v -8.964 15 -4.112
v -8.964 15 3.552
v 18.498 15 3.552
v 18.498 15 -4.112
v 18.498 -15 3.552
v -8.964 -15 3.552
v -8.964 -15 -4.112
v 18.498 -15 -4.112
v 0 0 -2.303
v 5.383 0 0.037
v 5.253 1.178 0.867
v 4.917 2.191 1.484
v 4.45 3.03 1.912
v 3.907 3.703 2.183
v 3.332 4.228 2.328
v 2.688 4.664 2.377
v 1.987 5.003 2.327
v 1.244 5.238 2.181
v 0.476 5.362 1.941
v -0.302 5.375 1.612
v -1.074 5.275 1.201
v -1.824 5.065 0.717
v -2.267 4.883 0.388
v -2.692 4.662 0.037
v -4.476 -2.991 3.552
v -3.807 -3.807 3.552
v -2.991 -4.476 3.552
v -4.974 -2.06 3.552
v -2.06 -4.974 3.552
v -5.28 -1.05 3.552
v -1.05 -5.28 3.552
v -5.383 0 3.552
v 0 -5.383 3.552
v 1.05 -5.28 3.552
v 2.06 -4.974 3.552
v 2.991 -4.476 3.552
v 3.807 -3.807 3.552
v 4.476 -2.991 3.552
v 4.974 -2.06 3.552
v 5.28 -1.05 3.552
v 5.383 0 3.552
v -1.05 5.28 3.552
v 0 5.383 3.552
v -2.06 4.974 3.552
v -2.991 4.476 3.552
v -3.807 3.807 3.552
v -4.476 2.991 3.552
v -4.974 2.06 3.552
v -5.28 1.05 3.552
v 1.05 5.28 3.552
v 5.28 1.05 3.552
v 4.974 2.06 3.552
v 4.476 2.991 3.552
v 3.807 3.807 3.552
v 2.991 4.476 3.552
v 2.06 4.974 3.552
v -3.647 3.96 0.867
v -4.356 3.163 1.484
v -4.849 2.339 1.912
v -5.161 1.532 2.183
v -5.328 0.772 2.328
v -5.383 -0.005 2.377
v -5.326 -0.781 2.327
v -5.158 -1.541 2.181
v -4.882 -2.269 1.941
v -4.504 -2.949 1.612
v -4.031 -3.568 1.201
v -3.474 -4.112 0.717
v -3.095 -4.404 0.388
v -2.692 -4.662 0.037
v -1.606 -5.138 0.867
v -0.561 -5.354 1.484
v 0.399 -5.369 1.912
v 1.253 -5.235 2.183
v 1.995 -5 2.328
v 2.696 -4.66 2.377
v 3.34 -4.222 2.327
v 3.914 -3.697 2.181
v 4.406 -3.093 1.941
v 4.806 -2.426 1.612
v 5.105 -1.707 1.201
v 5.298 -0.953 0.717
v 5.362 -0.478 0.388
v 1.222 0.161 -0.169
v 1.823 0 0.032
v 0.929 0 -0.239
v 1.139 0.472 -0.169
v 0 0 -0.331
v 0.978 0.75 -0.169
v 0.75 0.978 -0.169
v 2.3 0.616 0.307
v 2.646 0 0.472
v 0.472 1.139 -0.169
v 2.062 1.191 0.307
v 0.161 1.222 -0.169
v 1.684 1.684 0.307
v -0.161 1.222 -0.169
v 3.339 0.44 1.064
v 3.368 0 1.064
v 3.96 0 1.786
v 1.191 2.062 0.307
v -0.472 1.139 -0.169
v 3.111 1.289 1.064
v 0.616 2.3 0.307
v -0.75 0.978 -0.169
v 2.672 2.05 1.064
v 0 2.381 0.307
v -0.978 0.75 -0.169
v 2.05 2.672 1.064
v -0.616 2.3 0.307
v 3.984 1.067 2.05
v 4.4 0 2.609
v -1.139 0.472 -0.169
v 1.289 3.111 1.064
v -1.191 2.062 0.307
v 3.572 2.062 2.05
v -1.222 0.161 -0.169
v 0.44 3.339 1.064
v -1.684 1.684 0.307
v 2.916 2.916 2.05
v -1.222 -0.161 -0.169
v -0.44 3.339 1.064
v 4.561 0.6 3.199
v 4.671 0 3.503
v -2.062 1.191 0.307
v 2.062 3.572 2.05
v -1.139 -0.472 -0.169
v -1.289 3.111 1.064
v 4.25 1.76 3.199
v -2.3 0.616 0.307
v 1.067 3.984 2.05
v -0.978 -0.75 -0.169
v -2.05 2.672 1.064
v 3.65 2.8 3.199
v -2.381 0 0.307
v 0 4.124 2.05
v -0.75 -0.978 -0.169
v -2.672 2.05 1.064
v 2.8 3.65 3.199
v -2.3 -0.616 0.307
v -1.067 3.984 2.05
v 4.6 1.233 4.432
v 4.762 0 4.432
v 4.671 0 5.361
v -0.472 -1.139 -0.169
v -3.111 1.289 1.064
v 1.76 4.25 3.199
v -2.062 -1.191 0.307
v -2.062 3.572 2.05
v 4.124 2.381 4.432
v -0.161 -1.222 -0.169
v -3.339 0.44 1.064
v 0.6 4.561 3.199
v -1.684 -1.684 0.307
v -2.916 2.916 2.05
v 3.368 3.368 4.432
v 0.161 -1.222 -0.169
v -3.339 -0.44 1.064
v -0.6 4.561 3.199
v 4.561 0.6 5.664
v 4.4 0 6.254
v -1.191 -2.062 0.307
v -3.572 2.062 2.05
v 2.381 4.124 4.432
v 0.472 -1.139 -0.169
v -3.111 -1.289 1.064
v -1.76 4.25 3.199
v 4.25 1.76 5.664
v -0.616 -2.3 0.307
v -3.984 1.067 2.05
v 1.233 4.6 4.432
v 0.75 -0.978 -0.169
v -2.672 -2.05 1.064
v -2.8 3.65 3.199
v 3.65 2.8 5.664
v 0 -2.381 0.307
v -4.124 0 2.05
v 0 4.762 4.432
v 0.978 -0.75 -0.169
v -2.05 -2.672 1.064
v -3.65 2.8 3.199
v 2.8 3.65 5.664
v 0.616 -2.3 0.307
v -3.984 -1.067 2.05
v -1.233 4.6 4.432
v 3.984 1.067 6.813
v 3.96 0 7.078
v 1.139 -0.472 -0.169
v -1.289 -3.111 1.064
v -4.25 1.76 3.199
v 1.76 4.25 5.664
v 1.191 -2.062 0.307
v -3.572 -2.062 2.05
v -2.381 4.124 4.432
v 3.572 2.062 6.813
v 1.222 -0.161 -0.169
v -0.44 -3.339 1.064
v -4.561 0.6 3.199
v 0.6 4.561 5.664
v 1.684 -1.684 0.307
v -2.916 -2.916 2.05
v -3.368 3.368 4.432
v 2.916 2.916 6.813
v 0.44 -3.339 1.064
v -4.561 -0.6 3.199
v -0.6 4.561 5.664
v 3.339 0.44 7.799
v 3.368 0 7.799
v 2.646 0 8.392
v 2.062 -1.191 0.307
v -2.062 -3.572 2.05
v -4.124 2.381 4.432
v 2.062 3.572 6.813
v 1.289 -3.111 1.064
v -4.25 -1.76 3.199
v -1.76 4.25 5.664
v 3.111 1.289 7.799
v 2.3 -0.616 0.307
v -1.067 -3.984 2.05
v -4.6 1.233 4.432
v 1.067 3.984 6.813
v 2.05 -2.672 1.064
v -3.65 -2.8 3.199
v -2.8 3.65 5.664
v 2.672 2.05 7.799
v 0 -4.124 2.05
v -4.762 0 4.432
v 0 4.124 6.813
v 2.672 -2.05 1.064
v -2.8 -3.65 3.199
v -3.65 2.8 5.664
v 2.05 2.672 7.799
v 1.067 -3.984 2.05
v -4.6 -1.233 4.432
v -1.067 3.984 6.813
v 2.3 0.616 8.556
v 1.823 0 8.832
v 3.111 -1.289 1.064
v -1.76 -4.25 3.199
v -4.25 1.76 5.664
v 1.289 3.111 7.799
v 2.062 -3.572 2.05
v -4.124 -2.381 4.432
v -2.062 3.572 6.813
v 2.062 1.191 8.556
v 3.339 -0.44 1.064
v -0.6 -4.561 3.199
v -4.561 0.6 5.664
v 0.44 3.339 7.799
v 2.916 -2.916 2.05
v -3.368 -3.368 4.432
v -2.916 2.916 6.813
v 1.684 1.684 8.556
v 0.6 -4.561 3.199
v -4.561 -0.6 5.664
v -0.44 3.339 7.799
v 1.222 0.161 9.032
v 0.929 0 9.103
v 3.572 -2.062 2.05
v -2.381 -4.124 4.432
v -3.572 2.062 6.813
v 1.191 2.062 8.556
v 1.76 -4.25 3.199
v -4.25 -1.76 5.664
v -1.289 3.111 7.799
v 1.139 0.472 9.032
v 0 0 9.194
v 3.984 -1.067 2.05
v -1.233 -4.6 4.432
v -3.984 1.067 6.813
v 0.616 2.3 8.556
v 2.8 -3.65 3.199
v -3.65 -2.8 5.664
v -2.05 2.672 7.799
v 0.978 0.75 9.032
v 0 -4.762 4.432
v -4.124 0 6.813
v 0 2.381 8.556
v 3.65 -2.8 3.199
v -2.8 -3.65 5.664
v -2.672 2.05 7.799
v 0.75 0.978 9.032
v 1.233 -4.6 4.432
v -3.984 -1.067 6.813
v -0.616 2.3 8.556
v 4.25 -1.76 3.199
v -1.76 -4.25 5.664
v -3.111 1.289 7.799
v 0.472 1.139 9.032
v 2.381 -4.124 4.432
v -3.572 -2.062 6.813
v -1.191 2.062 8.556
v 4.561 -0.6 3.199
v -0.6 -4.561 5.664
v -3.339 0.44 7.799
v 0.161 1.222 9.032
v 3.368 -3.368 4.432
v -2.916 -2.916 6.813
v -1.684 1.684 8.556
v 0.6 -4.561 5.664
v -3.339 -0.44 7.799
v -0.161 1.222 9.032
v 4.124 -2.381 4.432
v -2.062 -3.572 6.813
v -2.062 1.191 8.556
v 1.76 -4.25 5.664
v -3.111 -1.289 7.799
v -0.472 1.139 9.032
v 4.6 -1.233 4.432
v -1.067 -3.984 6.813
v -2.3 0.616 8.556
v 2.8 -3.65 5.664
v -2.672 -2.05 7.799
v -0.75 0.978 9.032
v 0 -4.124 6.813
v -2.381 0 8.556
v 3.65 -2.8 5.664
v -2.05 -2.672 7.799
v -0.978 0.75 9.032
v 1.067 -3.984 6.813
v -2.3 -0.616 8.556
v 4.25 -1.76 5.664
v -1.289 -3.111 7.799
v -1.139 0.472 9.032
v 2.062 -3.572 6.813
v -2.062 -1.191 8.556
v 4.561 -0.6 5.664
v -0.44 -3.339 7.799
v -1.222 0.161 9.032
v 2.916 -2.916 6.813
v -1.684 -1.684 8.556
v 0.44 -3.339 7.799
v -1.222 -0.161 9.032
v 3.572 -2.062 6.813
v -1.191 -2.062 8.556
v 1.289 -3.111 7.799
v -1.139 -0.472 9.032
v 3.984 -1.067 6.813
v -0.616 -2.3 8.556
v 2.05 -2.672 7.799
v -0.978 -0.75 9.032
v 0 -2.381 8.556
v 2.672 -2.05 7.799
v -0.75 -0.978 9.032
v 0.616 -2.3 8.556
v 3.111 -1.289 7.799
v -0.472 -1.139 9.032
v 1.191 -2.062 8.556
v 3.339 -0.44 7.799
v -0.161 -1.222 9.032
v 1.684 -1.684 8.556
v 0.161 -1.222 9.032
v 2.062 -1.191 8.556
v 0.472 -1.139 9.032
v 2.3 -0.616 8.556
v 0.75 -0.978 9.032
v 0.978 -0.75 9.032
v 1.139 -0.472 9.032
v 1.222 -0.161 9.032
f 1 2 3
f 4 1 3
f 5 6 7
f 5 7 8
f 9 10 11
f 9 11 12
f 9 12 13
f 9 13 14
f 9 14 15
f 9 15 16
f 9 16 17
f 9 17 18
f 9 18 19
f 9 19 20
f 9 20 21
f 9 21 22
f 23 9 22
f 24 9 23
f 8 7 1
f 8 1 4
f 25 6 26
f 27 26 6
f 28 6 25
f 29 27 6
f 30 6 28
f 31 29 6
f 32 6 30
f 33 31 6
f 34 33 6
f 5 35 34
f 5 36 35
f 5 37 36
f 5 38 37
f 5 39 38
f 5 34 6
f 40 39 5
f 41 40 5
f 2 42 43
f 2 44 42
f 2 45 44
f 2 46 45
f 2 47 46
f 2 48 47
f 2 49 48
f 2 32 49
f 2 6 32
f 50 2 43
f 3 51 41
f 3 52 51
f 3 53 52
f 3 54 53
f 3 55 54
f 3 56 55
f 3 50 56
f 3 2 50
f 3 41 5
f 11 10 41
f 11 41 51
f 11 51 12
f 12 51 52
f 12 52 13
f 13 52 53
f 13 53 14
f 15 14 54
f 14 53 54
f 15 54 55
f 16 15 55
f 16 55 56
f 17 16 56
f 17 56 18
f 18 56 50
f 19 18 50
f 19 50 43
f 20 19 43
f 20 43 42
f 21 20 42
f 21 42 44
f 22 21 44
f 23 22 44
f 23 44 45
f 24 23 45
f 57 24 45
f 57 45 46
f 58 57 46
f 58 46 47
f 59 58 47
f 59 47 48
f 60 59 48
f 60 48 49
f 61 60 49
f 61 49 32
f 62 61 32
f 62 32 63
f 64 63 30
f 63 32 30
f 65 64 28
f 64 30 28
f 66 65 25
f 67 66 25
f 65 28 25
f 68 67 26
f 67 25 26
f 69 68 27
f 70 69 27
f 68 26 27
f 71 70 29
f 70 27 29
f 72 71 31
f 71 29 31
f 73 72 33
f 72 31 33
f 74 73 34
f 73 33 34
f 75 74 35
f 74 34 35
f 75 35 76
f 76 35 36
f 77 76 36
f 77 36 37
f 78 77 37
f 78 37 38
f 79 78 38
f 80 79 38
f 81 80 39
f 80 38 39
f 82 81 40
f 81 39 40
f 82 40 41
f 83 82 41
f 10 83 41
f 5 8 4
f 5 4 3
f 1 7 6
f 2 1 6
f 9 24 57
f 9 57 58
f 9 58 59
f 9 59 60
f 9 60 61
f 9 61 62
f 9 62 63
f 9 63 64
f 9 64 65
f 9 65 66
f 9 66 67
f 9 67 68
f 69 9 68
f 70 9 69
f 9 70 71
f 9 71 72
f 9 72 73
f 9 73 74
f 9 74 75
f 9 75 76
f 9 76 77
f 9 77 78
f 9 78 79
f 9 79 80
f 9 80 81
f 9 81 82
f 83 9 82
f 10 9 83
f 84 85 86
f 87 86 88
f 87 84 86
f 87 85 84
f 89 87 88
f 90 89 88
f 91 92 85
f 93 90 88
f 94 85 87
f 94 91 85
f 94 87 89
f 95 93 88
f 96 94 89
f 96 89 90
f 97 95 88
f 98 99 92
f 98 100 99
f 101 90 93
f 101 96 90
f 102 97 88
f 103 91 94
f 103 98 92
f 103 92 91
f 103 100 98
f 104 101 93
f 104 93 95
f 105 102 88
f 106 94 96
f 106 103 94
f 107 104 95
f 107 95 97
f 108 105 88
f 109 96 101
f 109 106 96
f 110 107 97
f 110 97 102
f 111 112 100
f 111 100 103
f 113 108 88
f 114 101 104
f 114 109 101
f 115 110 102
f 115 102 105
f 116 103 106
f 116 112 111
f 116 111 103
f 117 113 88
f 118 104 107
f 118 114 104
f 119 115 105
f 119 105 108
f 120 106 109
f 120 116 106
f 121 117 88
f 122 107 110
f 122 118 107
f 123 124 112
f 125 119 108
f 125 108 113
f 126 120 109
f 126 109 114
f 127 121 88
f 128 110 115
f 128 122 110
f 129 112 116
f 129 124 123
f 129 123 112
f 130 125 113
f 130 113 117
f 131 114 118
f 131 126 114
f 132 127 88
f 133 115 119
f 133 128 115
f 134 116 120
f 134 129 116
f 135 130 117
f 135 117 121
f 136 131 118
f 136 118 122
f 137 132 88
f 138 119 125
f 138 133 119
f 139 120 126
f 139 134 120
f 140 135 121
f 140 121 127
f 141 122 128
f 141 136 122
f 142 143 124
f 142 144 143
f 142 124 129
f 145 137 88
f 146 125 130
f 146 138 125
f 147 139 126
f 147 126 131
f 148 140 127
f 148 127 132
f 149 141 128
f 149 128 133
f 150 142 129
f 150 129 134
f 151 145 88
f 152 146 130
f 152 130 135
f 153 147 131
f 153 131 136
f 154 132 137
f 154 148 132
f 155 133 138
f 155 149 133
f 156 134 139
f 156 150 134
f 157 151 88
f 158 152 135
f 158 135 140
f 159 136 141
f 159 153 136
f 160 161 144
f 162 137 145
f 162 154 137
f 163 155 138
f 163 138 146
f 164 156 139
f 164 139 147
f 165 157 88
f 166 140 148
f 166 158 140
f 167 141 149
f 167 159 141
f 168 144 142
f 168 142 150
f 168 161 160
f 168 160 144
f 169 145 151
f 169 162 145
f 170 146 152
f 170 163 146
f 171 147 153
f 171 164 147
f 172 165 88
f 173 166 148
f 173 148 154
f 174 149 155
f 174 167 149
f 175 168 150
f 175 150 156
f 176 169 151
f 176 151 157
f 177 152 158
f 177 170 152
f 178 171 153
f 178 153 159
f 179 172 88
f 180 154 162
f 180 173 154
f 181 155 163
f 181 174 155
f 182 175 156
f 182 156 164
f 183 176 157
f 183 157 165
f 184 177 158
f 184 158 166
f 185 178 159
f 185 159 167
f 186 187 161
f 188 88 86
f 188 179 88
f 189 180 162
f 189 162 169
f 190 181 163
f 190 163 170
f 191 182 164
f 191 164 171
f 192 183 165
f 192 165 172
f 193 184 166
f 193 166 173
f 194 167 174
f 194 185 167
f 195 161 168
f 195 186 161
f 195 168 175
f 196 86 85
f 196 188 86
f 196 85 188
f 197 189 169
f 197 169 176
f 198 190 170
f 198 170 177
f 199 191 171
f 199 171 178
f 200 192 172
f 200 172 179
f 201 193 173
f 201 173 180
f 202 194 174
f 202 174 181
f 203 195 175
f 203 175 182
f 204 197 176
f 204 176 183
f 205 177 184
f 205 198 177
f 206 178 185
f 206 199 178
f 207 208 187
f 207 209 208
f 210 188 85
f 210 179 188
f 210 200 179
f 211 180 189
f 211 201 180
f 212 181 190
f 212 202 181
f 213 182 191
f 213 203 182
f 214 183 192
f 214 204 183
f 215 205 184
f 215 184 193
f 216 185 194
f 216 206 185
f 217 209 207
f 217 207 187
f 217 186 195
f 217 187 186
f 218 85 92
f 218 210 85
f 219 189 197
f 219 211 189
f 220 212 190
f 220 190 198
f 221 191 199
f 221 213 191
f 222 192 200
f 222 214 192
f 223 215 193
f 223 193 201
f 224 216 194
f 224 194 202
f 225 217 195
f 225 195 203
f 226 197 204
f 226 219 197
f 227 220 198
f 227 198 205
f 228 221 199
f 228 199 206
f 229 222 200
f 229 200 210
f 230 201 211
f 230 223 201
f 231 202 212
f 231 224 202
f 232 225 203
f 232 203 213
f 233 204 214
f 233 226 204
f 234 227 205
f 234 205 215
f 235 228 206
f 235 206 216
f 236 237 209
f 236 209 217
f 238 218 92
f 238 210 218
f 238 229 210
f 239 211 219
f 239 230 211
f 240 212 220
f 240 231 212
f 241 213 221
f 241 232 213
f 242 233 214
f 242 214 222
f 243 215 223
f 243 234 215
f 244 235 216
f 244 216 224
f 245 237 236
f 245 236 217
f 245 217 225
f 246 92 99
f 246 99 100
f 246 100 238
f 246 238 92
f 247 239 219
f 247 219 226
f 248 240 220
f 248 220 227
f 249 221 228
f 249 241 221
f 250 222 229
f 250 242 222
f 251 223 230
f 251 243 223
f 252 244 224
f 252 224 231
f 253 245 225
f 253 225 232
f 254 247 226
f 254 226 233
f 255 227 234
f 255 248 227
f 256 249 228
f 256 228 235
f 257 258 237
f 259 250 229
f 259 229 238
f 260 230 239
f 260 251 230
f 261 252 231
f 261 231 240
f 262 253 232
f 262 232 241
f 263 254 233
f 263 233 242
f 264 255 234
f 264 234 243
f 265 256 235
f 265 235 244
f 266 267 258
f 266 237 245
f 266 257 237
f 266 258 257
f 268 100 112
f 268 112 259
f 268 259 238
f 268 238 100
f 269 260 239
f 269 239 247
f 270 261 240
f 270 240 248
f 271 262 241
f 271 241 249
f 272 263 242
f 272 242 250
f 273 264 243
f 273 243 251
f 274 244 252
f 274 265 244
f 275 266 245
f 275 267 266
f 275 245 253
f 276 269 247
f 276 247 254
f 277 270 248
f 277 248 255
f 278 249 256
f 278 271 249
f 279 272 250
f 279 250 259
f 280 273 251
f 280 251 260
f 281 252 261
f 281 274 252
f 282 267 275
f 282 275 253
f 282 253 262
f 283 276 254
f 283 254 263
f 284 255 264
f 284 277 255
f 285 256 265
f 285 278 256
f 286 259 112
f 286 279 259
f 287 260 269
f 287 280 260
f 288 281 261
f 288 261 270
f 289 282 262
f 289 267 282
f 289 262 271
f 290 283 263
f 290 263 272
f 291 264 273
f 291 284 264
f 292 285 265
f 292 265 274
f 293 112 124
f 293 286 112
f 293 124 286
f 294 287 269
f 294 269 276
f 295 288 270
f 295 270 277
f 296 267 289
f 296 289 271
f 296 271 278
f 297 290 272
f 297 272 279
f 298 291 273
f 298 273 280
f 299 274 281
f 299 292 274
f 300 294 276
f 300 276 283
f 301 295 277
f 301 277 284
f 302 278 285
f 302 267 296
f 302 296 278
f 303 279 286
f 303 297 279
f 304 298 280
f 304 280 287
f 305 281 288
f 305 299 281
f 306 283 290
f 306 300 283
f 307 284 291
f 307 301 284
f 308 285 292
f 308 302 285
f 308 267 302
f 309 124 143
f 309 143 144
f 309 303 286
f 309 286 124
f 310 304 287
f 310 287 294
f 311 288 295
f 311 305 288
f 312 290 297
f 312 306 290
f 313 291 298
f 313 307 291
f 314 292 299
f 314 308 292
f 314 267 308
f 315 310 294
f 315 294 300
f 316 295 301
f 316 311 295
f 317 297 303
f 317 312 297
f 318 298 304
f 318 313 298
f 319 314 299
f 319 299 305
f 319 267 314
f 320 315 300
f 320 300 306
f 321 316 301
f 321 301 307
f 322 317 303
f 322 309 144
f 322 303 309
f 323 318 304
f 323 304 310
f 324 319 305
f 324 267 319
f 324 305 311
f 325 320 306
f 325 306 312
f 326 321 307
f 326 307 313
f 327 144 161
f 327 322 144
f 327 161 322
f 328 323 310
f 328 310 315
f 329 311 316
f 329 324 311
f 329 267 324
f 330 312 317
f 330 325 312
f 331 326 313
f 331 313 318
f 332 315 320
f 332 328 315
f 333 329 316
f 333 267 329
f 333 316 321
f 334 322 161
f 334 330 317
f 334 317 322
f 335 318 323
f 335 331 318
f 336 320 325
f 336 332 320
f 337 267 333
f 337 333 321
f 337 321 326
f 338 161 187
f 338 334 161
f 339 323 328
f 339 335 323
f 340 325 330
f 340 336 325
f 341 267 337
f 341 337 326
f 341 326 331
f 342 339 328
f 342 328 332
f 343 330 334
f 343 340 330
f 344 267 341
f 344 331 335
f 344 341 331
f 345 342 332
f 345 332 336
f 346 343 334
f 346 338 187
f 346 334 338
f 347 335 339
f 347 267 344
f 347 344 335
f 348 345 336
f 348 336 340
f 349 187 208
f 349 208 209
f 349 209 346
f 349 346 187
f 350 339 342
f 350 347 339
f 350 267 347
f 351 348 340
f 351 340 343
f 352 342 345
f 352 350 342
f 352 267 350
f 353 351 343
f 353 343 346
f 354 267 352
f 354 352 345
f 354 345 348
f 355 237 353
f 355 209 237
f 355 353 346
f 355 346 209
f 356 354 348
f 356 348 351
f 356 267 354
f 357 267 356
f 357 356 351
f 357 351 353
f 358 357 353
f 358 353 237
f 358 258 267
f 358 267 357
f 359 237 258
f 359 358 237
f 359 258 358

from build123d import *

# Parameters (mm, degrees)
F1_W     = 27.461335063
F1_H     = 7.6640169136
F2_DEPTH = 15
F5_R     = 5.3833305073


with BuildPart() as f2:
    # F1 (on Front) → F2 (new body, symmetric)
    with BuildSketch(Plane.XZ):
        with Locations((4.7669634223, -0.2798696514)):
            Rectangle(F1_W, F1_H)
    extrude(amount=F2_DEPTH, both=True)

    # F3 (on face) → F4 section 0
    with BuildSketch(Plane.XY.offset(3.5521388054), mode=Mode.PRIVATE) as f4_s0:
        Polygon((-6.7351920908, 11.6656949), (-6.7351920908, -11.6656949), (13.4703841816, 0), align=None)
    loft([f4_s0.sketch, Vertex(0, 0, -2.3034810466)], mode=Mode.SUBTRACT)

    # F5 (on face) → F6 (join, up to the next surface of F2)
    with BuildSketch(Plane.XY.offset(3.5521388054)):
        Polygon((-6.7351920908, 11.6656949), (-6.7351920908, -11.6656949), (13.4703841816, 0), align=None)
        Circle(F5_R, mode=Mode.SUBTRACT)
    extrude(until=Until.NEXT, dir=(0, 0, -1))


with BuildPart() as f7:
    # F0 (on Front) → F7 (revolve)
    with BuildSketch(Plane.XZ):
        with BuildLine():
            Line((0, 9.1942110442), (0, 4.4317110442))
            Line((0, 4.4317110442), (0, -0.3307889558))
            ThreePointArc((0, -0.3307889558), (4.7625, 4.4317110442), (0, 9.1942110442))
        make_face()
    revolve(axis=Axis((0, 0, 10.9121449929), (0, 0, 1)))


solid = Compound([f2.part, f7.part])
